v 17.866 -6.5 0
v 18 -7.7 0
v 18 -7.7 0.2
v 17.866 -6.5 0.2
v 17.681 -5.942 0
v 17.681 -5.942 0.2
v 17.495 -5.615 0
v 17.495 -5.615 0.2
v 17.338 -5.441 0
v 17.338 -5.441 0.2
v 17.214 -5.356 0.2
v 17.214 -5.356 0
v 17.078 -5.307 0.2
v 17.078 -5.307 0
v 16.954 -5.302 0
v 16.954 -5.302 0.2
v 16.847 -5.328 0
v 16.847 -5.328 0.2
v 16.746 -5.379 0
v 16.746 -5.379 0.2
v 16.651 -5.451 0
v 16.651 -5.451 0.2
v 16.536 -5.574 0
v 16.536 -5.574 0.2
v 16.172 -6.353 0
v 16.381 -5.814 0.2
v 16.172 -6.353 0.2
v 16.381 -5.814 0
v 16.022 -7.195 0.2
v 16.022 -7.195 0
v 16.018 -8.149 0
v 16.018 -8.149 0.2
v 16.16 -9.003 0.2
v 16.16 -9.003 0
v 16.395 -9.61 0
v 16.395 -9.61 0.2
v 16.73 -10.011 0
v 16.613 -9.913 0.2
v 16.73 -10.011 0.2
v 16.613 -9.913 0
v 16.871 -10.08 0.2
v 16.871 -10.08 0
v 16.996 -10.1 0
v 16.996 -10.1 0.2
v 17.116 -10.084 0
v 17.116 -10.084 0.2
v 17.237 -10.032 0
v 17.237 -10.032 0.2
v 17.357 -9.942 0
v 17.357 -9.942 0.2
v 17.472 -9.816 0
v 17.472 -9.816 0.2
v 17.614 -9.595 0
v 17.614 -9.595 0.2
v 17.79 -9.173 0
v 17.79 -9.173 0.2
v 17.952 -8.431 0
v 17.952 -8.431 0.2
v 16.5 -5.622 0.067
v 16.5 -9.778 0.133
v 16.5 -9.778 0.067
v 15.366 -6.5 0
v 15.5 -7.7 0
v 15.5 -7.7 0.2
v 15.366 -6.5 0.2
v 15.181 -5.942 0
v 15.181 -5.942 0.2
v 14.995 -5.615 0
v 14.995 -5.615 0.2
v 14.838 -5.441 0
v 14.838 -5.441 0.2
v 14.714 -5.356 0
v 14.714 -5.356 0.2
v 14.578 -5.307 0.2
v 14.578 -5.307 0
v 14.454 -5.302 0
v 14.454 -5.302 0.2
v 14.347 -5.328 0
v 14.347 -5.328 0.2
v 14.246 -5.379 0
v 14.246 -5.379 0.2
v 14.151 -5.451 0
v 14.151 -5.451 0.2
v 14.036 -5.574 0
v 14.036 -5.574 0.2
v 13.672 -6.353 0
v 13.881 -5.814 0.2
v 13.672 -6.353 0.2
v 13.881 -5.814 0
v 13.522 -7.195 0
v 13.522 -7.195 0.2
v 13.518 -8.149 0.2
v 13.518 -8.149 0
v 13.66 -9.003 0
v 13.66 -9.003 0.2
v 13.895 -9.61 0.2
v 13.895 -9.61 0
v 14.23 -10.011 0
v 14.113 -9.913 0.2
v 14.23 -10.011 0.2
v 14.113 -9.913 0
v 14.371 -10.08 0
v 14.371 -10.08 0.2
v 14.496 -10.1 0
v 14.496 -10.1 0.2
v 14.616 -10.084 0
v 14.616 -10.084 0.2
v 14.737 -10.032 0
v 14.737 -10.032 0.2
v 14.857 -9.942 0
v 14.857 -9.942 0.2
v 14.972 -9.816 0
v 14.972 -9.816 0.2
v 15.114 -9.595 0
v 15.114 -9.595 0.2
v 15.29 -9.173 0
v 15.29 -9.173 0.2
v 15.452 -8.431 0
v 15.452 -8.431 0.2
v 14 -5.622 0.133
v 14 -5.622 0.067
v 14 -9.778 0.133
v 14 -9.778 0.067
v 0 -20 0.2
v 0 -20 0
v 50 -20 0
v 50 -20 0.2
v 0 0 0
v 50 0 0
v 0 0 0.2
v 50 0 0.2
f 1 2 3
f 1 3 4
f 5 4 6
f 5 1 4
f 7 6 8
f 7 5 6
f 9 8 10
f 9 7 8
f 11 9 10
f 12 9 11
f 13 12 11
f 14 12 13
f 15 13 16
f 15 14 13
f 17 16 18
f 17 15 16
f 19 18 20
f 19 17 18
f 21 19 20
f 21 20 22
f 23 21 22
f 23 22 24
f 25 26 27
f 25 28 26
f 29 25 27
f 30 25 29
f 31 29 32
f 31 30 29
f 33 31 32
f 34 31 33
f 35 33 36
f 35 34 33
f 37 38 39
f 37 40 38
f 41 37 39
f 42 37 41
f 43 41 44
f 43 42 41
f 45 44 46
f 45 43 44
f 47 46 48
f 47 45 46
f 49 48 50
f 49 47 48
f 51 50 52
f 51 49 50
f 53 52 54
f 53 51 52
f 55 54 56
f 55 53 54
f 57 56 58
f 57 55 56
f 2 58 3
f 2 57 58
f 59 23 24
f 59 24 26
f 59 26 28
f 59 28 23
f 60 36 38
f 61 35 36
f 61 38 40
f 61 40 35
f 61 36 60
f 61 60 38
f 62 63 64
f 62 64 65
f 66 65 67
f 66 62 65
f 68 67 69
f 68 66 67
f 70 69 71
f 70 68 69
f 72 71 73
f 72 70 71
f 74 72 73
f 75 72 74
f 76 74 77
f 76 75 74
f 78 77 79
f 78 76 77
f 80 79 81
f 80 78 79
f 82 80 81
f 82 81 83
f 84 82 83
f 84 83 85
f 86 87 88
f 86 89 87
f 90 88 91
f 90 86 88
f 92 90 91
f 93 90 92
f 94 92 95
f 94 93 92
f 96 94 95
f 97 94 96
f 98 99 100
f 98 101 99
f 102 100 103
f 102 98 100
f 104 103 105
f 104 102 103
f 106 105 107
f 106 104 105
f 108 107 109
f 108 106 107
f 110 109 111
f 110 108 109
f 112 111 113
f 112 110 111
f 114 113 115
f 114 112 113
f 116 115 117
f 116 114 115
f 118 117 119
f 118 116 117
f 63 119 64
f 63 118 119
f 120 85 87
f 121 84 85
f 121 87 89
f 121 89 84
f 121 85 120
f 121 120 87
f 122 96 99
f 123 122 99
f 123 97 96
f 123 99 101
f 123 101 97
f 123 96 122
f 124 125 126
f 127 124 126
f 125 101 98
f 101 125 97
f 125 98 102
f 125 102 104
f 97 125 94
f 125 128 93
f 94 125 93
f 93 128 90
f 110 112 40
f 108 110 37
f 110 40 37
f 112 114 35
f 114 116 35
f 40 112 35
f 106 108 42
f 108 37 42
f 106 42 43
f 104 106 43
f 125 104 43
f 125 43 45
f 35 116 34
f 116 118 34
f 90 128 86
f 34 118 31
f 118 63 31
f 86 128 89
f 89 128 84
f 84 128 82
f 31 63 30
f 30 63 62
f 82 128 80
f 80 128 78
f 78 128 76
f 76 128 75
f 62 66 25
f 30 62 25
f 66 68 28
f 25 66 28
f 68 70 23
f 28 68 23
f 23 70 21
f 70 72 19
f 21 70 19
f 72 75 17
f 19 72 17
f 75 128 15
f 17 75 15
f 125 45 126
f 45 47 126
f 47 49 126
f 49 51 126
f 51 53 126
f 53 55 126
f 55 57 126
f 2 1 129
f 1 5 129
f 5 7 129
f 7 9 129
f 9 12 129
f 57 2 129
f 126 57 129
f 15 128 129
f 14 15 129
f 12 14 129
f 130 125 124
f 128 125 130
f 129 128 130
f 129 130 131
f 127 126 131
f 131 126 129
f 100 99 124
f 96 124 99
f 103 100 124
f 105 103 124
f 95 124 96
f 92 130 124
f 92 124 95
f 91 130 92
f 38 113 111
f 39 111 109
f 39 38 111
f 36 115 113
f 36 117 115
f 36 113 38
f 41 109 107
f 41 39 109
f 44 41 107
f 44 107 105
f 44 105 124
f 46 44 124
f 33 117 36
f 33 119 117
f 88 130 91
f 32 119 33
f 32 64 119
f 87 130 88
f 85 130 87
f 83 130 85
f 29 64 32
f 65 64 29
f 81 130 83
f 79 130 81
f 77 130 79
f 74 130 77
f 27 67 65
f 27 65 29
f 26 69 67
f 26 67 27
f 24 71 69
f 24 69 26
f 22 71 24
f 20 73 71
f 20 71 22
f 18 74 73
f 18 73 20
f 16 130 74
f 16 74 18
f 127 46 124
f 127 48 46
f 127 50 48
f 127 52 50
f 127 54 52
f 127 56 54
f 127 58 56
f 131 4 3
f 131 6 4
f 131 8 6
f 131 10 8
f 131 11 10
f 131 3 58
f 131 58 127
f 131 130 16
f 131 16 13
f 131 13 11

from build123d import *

# Parameters (mm, degrees)
F0_W     = 50
F0_H     = 20
F1_DEPTH = 0.2


with BuildPart() as f1:
    # F0 (on Top) → F1 (new body)
    with BuildSketch(Plane.XY):
        with Locations((25, -10)):
            Rectangle(F0_W, F0_H)
        with BuildLine():
            add(Edge.make_bspline(
                [(15.5, -7.7), (15.5, -3.543078), (14, -5.621539), (12.5, -7.7), (14, -9.778461), (15.5, -11.856922), (15.5, -7.7)],
                knots=[4.712389, 4.712389, 4.712389, 6.806784, 6.806784, 8.901179, 8.901179, 10.995574, 10.995574, 10.995574], degree=2, weights=[1, 0.5, 1, 0.5, 1, 0.5, 1]))
        make_face(mode=Mode.SUBTRACT)
        with BuildLine():
            add(Edge.make_bspline(
                [(18, -7.7), (18, -3.543078), (16.5, -5.621539), (15, -7.7), (16.5, -9.778461), (18, -11.856922), (18, -7.7)],
                knots=[4.712389, 4.712389, 4.712389, 6.806784, 6.806784, 8.901179, 8.901179, 10.995574, 10.995574, 10.995574], degree=2, weights=[1, 0.5, 1, 0.5, 1, 0.5, 1]))
        make_face(mode=Mode.SUBTRACT)
    extrude(amount=F1_DEPTH)


solid = f1.part
